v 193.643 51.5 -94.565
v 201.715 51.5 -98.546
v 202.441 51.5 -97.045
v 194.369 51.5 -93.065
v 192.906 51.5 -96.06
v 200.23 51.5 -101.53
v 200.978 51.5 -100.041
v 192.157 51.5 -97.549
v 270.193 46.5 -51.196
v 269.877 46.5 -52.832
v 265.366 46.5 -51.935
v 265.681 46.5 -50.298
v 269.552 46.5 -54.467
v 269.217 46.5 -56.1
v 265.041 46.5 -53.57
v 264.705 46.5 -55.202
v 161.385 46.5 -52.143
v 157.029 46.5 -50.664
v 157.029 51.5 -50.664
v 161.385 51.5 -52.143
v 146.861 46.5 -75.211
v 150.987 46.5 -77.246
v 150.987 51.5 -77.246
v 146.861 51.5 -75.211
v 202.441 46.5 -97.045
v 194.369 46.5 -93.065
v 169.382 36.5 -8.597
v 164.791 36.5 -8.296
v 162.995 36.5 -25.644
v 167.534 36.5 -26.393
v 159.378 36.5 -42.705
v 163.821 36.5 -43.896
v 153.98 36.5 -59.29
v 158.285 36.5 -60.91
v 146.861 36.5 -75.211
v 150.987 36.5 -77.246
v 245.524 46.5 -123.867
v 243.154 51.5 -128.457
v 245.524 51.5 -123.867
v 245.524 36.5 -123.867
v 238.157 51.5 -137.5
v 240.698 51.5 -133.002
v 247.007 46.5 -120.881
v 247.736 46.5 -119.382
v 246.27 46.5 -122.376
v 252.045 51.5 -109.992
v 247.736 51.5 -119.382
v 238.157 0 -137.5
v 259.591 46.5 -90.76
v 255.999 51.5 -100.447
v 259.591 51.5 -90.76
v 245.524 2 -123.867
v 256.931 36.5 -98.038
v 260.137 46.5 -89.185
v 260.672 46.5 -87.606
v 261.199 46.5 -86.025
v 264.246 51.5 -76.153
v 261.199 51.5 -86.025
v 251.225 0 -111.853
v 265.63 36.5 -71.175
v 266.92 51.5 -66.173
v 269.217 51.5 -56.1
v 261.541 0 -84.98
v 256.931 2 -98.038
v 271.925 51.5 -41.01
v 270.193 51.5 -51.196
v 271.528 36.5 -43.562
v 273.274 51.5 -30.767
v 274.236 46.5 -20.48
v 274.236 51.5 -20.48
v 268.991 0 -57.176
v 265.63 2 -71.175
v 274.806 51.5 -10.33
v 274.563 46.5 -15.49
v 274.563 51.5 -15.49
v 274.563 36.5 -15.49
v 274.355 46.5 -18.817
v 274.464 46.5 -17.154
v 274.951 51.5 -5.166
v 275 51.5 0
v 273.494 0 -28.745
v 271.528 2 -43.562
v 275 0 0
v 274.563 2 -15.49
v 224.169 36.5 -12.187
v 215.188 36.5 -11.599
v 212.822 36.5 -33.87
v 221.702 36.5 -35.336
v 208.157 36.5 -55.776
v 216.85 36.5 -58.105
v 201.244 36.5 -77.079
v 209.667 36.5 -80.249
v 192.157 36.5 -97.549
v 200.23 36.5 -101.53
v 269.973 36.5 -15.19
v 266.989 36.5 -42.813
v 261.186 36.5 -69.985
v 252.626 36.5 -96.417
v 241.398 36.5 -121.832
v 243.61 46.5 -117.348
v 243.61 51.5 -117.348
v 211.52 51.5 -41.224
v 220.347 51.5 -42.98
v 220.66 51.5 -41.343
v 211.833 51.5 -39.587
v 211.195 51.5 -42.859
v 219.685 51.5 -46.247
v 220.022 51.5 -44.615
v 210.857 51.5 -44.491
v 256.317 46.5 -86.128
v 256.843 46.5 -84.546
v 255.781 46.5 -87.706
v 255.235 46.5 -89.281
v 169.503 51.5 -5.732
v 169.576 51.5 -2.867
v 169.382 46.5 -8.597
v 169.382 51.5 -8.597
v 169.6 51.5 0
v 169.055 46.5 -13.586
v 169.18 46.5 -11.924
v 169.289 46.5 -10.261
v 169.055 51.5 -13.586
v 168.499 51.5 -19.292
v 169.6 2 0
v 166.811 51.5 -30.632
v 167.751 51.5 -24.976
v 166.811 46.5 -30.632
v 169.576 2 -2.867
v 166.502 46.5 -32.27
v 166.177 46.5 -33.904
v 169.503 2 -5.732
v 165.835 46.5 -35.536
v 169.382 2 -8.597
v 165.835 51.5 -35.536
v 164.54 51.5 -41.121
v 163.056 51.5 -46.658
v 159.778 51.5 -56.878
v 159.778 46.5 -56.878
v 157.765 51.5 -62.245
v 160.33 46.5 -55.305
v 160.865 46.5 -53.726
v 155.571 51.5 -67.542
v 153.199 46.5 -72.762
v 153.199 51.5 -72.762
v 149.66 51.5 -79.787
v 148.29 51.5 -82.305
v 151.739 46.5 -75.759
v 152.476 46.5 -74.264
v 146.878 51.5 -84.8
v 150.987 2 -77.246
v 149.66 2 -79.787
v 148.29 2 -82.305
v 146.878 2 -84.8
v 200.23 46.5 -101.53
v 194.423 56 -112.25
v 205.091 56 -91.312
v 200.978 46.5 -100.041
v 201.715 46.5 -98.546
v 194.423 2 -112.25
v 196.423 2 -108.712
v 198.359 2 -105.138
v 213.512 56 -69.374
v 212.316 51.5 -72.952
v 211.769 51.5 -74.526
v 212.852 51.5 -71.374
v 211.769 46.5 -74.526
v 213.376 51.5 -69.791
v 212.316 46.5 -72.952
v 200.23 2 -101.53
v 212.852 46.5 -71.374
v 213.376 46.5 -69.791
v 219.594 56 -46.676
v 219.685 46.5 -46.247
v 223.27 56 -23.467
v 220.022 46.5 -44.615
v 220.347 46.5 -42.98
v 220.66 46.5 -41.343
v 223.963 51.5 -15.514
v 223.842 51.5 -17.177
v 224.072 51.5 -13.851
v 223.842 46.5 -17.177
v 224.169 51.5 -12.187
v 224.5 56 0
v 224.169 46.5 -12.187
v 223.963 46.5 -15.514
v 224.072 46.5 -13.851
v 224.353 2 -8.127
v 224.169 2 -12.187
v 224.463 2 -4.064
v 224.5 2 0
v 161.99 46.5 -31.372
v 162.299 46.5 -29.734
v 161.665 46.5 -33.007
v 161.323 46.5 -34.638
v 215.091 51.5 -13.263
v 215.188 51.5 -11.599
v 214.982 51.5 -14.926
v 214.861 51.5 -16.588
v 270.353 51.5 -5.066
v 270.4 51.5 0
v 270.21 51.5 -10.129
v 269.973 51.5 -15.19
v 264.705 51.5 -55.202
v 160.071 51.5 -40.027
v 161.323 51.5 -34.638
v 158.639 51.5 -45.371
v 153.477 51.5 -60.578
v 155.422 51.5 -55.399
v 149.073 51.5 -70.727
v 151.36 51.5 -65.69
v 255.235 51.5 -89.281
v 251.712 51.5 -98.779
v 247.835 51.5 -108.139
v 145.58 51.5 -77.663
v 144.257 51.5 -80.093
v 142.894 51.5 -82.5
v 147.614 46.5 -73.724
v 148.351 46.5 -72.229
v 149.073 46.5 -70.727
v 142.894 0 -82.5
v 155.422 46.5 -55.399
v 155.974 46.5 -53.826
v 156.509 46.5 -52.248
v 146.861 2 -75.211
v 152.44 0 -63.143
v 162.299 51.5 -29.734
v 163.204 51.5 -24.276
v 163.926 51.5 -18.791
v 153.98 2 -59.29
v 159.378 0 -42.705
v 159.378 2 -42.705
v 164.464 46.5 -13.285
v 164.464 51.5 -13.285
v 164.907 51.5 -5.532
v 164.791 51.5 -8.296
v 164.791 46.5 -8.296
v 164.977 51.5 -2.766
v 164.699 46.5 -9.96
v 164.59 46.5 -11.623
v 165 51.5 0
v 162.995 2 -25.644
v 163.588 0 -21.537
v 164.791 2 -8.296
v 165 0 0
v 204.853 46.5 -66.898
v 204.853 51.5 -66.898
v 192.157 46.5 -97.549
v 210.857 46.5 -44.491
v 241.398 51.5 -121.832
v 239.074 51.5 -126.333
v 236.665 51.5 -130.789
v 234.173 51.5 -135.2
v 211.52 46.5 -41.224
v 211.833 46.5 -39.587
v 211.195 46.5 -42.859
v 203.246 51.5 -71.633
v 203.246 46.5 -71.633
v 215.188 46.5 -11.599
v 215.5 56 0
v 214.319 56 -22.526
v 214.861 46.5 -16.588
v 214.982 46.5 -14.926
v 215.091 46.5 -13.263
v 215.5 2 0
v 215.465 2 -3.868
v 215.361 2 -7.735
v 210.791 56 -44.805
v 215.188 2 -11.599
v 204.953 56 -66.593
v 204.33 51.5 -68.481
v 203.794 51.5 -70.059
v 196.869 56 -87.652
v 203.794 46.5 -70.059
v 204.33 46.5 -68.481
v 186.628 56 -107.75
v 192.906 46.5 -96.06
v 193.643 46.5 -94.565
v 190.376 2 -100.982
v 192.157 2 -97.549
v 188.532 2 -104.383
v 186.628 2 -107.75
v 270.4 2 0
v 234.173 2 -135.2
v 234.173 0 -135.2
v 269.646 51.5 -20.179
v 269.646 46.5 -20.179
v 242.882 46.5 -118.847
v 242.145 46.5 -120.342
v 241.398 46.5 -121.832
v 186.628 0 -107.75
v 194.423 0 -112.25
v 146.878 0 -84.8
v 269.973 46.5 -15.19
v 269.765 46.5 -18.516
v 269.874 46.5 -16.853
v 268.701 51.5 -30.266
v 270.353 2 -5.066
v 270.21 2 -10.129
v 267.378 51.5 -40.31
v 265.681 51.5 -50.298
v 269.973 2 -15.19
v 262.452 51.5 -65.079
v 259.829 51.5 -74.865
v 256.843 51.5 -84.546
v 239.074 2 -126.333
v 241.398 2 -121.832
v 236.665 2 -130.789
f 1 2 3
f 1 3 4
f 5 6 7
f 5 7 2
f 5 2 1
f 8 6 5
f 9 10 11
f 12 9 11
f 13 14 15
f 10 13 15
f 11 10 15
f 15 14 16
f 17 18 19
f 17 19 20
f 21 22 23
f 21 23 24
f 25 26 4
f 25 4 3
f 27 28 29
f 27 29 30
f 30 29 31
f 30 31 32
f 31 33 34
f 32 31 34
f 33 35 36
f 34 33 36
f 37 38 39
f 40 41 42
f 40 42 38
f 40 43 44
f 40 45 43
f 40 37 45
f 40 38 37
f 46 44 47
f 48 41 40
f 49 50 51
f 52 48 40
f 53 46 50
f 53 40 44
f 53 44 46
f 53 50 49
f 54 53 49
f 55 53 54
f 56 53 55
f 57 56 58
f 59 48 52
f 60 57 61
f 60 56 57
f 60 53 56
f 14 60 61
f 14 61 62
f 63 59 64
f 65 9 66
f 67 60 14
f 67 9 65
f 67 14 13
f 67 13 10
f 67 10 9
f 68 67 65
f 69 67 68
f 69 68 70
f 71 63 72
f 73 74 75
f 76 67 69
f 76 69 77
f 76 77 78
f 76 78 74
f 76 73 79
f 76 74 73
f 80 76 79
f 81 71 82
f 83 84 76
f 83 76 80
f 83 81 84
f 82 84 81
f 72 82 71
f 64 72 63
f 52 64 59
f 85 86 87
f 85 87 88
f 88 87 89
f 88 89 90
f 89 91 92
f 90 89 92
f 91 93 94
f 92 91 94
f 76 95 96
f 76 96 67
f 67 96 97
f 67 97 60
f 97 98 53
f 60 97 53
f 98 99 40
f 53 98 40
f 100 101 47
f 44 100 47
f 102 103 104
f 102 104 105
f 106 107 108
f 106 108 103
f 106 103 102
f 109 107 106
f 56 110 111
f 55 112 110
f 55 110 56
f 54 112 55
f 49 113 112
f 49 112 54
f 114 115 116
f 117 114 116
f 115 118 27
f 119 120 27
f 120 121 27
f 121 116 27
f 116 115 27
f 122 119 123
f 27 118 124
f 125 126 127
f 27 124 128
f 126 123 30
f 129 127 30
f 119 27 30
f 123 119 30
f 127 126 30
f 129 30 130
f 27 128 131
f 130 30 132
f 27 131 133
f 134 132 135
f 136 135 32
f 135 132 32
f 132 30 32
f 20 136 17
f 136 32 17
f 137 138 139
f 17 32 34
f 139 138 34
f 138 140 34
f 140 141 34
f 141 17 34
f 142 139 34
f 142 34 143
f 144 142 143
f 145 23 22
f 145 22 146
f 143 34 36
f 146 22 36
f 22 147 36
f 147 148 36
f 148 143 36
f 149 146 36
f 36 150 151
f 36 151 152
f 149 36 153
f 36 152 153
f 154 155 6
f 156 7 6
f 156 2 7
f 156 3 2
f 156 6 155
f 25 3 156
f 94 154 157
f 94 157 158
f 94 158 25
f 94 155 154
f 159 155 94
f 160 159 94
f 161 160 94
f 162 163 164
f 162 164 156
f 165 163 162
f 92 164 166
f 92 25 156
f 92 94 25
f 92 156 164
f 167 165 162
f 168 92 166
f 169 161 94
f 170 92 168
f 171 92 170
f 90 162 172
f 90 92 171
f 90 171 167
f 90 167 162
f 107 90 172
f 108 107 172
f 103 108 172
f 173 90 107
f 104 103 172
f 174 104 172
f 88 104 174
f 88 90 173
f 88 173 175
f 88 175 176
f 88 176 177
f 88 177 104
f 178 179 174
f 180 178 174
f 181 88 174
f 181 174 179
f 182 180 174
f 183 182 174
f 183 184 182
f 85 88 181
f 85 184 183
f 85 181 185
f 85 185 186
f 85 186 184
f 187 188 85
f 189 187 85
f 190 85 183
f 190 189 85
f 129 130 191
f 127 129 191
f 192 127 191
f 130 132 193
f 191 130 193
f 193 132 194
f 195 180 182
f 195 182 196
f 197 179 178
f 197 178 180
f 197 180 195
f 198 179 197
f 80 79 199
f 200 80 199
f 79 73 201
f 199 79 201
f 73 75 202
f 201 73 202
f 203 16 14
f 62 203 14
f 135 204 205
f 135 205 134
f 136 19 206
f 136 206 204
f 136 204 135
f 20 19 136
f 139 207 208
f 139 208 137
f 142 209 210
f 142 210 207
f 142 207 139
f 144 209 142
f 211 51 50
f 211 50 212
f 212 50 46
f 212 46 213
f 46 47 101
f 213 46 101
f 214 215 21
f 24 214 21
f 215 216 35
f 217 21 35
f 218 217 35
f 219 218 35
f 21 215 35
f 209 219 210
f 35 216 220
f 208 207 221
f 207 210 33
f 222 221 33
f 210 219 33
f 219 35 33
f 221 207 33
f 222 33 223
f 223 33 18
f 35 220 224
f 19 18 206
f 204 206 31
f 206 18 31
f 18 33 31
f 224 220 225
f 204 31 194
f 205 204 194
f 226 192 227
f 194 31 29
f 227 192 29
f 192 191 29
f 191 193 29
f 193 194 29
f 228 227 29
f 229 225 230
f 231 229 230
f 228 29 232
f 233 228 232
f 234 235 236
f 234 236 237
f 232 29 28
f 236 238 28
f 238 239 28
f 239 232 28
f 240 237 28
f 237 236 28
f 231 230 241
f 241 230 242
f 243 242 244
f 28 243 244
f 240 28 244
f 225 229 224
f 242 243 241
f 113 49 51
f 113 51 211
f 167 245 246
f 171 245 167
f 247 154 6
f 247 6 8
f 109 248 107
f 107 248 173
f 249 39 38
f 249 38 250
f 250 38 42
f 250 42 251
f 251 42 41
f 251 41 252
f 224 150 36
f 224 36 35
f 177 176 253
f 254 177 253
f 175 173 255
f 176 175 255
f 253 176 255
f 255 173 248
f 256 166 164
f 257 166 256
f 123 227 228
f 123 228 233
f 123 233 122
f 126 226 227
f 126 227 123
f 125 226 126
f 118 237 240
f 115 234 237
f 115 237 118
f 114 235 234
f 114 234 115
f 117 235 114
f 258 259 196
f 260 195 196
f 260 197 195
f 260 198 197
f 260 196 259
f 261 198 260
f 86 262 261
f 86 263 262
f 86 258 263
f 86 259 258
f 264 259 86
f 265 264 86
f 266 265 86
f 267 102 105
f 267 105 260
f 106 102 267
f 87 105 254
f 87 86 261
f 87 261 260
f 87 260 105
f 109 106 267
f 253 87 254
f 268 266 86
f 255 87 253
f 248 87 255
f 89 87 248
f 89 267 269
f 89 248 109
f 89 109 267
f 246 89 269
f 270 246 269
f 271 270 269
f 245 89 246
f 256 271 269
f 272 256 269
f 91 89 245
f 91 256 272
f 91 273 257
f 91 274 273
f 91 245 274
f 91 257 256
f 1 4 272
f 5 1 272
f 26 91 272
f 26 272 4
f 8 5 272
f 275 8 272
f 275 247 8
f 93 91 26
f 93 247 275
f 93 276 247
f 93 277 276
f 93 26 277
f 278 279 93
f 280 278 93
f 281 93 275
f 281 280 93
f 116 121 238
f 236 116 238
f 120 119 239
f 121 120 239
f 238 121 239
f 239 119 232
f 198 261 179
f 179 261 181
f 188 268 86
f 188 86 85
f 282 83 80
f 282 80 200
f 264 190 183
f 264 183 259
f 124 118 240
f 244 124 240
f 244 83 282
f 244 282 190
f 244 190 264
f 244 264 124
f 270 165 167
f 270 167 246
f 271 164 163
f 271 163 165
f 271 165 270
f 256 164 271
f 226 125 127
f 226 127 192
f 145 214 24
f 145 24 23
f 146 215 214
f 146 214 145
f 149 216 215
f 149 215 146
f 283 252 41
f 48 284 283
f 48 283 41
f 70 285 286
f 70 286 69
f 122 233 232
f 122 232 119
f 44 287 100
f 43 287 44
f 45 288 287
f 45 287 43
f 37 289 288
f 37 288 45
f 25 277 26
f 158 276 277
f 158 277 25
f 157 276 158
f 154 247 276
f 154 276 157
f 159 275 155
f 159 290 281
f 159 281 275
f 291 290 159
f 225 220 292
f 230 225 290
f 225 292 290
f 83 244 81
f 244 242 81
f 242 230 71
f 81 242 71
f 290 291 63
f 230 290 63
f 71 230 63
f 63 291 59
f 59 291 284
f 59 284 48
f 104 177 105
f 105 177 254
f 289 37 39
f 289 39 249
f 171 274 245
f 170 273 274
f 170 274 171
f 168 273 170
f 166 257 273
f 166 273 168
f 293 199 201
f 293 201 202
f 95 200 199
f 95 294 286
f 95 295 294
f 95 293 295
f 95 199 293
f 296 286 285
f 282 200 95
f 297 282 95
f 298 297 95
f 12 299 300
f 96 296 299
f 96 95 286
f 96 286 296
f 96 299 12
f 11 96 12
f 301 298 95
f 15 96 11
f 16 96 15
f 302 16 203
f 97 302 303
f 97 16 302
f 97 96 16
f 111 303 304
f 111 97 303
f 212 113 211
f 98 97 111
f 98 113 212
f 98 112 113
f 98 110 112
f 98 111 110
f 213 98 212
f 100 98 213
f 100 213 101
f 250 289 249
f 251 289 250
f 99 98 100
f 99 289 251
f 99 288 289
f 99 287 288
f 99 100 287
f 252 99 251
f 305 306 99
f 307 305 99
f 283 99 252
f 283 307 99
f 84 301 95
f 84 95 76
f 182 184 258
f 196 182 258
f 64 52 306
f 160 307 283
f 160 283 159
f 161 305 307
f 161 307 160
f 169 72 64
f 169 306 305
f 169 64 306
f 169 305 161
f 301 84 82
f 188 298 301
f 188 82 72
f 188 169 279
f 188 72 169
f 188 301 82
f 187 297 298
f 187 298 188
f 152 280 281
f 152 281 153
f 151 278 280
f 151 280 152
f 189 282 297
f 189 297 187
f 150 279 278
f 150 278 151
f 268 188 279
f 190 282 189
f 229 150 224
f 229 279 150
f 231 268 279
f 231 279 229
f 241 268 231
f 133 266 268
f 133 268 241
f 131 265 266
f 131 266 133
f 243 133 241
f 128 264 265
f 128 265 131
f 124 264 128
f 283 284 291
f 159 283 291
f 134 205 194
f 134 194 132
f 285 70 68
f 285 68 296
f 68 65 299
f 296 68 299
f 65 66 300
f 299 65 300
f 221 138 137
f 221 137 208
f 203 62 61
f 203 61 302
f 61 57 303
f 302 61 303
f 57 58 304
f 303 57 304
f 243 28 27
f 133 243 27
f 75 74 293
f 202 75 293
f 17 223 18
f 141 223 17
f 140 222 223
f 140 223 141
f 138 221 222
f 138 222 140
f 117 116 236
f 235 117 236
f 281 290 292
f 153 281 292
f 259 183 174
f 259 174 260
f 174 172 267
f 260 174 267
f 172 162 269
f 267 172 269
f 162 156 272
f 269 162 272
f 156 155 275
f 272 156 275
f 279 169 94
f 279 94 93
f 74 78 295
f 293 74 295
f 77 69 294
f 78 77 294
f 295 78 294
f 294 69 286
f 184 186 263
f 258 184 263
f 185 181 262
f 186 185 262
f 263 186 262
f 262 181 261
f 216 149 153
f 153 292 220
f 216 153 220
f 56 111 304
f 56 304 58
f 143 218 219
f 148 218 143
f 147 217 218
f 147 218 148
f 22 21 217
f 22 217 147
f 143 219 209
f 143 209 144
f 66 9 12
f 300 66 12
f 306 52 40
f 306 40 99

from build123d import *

# Parameters (mm, degrees)
AUFSATZ_LINEAR_AUSTRAGEN1_DEPTH   = 51.5
AUFSATZ_LINEAR_AUSTRAGEN1_2_DEPTH = 51.5
AUFSATZ_LINEAR_AUSTRAGEN1_3_DEPTH = 51.5
SCHNITT_LINEAR_START              = -5
SCHNITT_LINEAR_AUSTRAGEN1_DEPTH   = 5
AUFSATZ_LINEAR_AUSTRAGEN2_DEPTH   = 2
SCHNITT_LINEAR_START_2            = -49.5
SCHNITT_LINEAR_AUSTRAGEN2_DEPTH   = 34.5
AUFSATZ_LINEAR_AUSTRAGEN3_DEPTH   = 4.5


with BuildPart() as part:
    # Skizze1 → Aufsatz-Linear austragen1 (new body)
    with BuildSketch(Plane(origin=(0, 0, 0), x_dir=(1, 0, 0), z_dir=(0, 1, 0))):
        with BuildLine():
            Line((165, 0), (169.6, 0))
            ThreePointArc((169.6, 0), (163.821020139, 43.895710049), (146.877908482, 84.8))
            Line((146.877908482, 84.8), (142.894191624, 82.5))
            ThreePointArc((142.894191624, 82.5), (159.377761338, 42.705142442), (165, 0))
        make_face()
    extrude(amount=AUFSATZ_LINEAR_AUSTRAGEN1_DEPTH)


with BuildPart() as body_2:
    # Skizze1 → Aufsatz-Linear austragen1 2 (new body)
    with BuildSketch(Plane(origin=(0, 0, 0), x_dir=(1, 0, 0), z_dir=(0, 1, 0))):
        with BuildLine():
            Line((215.5, 0), (224.5, 0))
            ThreePointArc((224.5, 0), (216.850348002, 58.104875626), (194.42270315, 112.25))
            Line((194.42270315, 112.25), (186.628474516, 107.75))
            ThreePointArc((186.628474516, 107.75), (208.157015565, 55.77550422), (215.5, 0))
        make_face()
    extrude(amount=AUFSATZ_LINEAR_AUSTRAGEN1_2_DEPTH)


with BuildPart() as body_3:
    # Skizze1 → Aufsatz-Linear austragen1 3 (new body)
    with BuildSketch(Plane(origin=(0, 0, 0), x_dir=(1, 0, 0), z_dir=(0, 1, 0))):
        with BuildLine():
            Line((234.173269183, 135.2), (238.156986041, 137.5))
            ThreePointArc((238.156986041, 137.5), (265.629602229, 71.175237403), (275, 0))
            Line((275, 0), (270.4, 0))
            ThreePointArc((270.4, 0), (261.186343429, 69.984669796), (234.173269183, 135.2))
        make_face()
    extrude(amount=AUFSATZ_LINEAR_AUSTRAGEN1_3_DEPTH)


with BuildPart() as schnitt_linear_austragen1_tool:
    # Skizze2 → Schnitt-Linear austragen1 (new body)
    with BuildSketch(Plane(origin=(0, 51.5, 0), x_dir=(1, 0, 0), z_dir=(0, 1, 0)).offset(SCHNITT_LINEAR_START)):
        with BuildLine():
            Line((164.464314583, 13.284924864), (274.236356527, 20.479764614))
            ThreePointArc((274.236356527, 20.479764614), (274.411203891, 17.985860538), (274.563372173, 15.490469997))
            Line((274.563372173, 15.490469997), (164.791330229, 8.295630248))
            ThreePointArc((164.791330229, 8.295630248), (164.646722334, 10.791516323), (164.464314583, 13.284924864))
        make_face()
        with BuildLine():
            Line((161.323268916, 34.638171229), (269.217080788, 56.099584774))
            ThreePointArc((269.217080788, 56.099584774), (269.715952111, 53.649838554), (270.192532398, 51.195658372))
            Line((270.192532398, 51.195658372), (162.298720527, 29.734244827))
            ThreePointArc((162.298720527, 29.734244827), (161.829571267, 32.189903133), (161.323268916, 34.638171229))
        make_face()
        with BuildLine():
            Line((157.029134718, 50.664098233), (261.198623482, 86.024874838))
            ThreePointArc((261.198623482, 86.024874838), (260.405785611, 88.395852958), (259.591426156, 90.759525485))
            Line((259.591426156, 90.759525485), (155.421937391, 55.398748881))
            ThreePointArc((155.421937391, 55.398748881), (156.243471367, 53.037511775), (157.029134718, 50.664098233))
        make_face()
        with BuildLine():
            Line((149.072736877, 70.727074872), (247.735533701, 119.382181845))
            ThreePointArc((247.735533701, 119.382181845), (246.640003921, 121.62938981), (245.52409025, 123.866545552))
            Line((245.52409025, 123.866545552), (146.861293426, 75.211438579))
            ThreePointArc((146.861293426, 75.211438579), (147.984002353, 72.977633886), (149.072736877, 70.727074872))
        make_face()
    extrude(amount=SCHNITT_LINEAR_AUSTRAGEN1_DEPTH)


with BuildPart() as part_1:
    add(part.part)

    # Schnitt-Linear austragen1: cut by schnitt_linear_austragen1_tool
    add(schnitt_linear_austragen1_tool.part, mode=Mode.SUBTRACT)



with BuildPart() as body_2_1:
    add(body_2.part)

    # Schnitt-Linear austragen1: cut by schnitt_linear_austragen1_tool
    add(schnitt_linear_austragen1_tool.part, mode=Mode.SUBTRACT)


with BuildPart() as body_3_1:
    add(body_3.part)

    # Schnitt-Linear austragen1: cut by schnitt_linear_austragen1_tool
    add(schnitt_linear_austragen1_tool.part, mode=Mode.SUBTRACT)


with BuildPart() as part_2:
    add(part_1.part)

    add(body_2_1.part)  # Aufsatz-Linear austragen2 merges body 2

    add(body_3_1.part)  # Aufsatz-Linear austragen2 merges body 3
    # Skizze4 → Aufsatz-Linear austragen2 (add)
    with BuildSketch(Plane.XZ):
        with BuildLine():
            Line((165, 0), (275, 0))
            ThreePointArc((275, 0), (265.629602229, -71.175237403), (238.156986041, -137.5))
            Line((238.156986041, -137.5), (142.894191624, -82.5))
            ThreePointArc((142.894191624, -82.5), (159.377761338, -42.705142442), (165, 0))
        make_face()
    extrude(amount=-AUFSATZ_LINEAR_AUSTRAGEN2_DEPTH)

    # Skizze5 → Schnitt-Linear austragen2 (cut)
    with BuildSketch(Plane(origin=(0, 51.5, 0), x_dir=(1, 0, 0), z_dir=(0, 1, 0)).offset(SCHNITT_LINEAR_START_2)):
        with BuildLine():
            Line((164.791330229, 8.295630248), (274.563372173, 15.490469997))
            ThreePointArc((274.563372173, 15.490469997), (265.629602229, 71.175237403), (245.52409025, 123.866545552))
            Line((245.52409025, 123.866545552), (146.861293426, 75.211438579))
            ThreePointArc((146.861293426, 75.211438579), (159.377761338, 42.705142442), (164.791330229, 8.295630248))
        make_face()
    extrude(amount=SCHNITT_LINEAR_AUSTRAGEN2_DEPTH, mode=Mode.SUBTRACT)

    # Skizze6 → Aufsatz-Linear austragen3 (add)
    with BuildSketch(Plane(origin=(0, 51.5, 0), x_dir=(1, 0, 0), z_dir=(0, 1, 0))):
        with BuildLine():
            Line((186.628474516, 107.75), (194.42270315, 112.25))
            ThreePointArc((194.42270315, 112.25), (216.850348002, 58.104875626), (224.5, 0))
            Line((224.5, 0), (215.5, 0))
            ThreePointArc((215.5, 0), (208.157015565, 55.77550422), (186.628474516, 107.75))
        make_face()
    extrude(amount=AUFSATZ_LINEAR_AUSTRAGEN3_DEPTH)


solid = part_2.part
